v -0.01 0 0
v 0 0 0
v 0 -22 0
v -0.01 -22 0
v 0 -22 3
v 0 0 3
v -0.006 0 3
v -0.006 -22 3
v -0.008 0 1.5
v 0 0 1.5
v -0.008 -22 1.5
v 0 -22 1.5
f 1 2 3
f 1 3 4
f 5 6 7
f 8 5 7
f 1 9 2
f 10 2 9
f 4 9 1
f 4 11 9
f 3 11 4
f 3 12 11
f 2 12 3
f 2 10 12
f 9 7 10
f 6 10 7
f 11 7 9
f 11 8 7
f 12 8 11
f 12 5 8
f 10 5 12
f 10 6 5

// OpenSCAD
// latches/friction_overlap.scad — no hardware, ends overlap and TPU-on-TPU grip
// holds.
// MIT licensed.
//
// Adds a small taper at both ends (thinner) so the overlap zone doesn't
// double the wrist's wrap diameter visibly. Adjustable by sliding.

module latch_friction_overlap(band_width, band_thickness) {
    taper_l = 18;  // mm of taper into each end

    // left end taper: shrink to half thickness over taper_l
    translate([0, 0, 0])
        rotate([0, 0, 180])
            linear_extrude(height = band_thickness, scale = [0.6, 1.0])
                square([0.01, band_width], center = false);

    // The above is just a visual hint — the actual taper is handled by the
    // band itself; this module is intentionally minimal because friction
    // overlap requires NO added hardware.
}

// development render
latch_friction_overlap(22, 3);
